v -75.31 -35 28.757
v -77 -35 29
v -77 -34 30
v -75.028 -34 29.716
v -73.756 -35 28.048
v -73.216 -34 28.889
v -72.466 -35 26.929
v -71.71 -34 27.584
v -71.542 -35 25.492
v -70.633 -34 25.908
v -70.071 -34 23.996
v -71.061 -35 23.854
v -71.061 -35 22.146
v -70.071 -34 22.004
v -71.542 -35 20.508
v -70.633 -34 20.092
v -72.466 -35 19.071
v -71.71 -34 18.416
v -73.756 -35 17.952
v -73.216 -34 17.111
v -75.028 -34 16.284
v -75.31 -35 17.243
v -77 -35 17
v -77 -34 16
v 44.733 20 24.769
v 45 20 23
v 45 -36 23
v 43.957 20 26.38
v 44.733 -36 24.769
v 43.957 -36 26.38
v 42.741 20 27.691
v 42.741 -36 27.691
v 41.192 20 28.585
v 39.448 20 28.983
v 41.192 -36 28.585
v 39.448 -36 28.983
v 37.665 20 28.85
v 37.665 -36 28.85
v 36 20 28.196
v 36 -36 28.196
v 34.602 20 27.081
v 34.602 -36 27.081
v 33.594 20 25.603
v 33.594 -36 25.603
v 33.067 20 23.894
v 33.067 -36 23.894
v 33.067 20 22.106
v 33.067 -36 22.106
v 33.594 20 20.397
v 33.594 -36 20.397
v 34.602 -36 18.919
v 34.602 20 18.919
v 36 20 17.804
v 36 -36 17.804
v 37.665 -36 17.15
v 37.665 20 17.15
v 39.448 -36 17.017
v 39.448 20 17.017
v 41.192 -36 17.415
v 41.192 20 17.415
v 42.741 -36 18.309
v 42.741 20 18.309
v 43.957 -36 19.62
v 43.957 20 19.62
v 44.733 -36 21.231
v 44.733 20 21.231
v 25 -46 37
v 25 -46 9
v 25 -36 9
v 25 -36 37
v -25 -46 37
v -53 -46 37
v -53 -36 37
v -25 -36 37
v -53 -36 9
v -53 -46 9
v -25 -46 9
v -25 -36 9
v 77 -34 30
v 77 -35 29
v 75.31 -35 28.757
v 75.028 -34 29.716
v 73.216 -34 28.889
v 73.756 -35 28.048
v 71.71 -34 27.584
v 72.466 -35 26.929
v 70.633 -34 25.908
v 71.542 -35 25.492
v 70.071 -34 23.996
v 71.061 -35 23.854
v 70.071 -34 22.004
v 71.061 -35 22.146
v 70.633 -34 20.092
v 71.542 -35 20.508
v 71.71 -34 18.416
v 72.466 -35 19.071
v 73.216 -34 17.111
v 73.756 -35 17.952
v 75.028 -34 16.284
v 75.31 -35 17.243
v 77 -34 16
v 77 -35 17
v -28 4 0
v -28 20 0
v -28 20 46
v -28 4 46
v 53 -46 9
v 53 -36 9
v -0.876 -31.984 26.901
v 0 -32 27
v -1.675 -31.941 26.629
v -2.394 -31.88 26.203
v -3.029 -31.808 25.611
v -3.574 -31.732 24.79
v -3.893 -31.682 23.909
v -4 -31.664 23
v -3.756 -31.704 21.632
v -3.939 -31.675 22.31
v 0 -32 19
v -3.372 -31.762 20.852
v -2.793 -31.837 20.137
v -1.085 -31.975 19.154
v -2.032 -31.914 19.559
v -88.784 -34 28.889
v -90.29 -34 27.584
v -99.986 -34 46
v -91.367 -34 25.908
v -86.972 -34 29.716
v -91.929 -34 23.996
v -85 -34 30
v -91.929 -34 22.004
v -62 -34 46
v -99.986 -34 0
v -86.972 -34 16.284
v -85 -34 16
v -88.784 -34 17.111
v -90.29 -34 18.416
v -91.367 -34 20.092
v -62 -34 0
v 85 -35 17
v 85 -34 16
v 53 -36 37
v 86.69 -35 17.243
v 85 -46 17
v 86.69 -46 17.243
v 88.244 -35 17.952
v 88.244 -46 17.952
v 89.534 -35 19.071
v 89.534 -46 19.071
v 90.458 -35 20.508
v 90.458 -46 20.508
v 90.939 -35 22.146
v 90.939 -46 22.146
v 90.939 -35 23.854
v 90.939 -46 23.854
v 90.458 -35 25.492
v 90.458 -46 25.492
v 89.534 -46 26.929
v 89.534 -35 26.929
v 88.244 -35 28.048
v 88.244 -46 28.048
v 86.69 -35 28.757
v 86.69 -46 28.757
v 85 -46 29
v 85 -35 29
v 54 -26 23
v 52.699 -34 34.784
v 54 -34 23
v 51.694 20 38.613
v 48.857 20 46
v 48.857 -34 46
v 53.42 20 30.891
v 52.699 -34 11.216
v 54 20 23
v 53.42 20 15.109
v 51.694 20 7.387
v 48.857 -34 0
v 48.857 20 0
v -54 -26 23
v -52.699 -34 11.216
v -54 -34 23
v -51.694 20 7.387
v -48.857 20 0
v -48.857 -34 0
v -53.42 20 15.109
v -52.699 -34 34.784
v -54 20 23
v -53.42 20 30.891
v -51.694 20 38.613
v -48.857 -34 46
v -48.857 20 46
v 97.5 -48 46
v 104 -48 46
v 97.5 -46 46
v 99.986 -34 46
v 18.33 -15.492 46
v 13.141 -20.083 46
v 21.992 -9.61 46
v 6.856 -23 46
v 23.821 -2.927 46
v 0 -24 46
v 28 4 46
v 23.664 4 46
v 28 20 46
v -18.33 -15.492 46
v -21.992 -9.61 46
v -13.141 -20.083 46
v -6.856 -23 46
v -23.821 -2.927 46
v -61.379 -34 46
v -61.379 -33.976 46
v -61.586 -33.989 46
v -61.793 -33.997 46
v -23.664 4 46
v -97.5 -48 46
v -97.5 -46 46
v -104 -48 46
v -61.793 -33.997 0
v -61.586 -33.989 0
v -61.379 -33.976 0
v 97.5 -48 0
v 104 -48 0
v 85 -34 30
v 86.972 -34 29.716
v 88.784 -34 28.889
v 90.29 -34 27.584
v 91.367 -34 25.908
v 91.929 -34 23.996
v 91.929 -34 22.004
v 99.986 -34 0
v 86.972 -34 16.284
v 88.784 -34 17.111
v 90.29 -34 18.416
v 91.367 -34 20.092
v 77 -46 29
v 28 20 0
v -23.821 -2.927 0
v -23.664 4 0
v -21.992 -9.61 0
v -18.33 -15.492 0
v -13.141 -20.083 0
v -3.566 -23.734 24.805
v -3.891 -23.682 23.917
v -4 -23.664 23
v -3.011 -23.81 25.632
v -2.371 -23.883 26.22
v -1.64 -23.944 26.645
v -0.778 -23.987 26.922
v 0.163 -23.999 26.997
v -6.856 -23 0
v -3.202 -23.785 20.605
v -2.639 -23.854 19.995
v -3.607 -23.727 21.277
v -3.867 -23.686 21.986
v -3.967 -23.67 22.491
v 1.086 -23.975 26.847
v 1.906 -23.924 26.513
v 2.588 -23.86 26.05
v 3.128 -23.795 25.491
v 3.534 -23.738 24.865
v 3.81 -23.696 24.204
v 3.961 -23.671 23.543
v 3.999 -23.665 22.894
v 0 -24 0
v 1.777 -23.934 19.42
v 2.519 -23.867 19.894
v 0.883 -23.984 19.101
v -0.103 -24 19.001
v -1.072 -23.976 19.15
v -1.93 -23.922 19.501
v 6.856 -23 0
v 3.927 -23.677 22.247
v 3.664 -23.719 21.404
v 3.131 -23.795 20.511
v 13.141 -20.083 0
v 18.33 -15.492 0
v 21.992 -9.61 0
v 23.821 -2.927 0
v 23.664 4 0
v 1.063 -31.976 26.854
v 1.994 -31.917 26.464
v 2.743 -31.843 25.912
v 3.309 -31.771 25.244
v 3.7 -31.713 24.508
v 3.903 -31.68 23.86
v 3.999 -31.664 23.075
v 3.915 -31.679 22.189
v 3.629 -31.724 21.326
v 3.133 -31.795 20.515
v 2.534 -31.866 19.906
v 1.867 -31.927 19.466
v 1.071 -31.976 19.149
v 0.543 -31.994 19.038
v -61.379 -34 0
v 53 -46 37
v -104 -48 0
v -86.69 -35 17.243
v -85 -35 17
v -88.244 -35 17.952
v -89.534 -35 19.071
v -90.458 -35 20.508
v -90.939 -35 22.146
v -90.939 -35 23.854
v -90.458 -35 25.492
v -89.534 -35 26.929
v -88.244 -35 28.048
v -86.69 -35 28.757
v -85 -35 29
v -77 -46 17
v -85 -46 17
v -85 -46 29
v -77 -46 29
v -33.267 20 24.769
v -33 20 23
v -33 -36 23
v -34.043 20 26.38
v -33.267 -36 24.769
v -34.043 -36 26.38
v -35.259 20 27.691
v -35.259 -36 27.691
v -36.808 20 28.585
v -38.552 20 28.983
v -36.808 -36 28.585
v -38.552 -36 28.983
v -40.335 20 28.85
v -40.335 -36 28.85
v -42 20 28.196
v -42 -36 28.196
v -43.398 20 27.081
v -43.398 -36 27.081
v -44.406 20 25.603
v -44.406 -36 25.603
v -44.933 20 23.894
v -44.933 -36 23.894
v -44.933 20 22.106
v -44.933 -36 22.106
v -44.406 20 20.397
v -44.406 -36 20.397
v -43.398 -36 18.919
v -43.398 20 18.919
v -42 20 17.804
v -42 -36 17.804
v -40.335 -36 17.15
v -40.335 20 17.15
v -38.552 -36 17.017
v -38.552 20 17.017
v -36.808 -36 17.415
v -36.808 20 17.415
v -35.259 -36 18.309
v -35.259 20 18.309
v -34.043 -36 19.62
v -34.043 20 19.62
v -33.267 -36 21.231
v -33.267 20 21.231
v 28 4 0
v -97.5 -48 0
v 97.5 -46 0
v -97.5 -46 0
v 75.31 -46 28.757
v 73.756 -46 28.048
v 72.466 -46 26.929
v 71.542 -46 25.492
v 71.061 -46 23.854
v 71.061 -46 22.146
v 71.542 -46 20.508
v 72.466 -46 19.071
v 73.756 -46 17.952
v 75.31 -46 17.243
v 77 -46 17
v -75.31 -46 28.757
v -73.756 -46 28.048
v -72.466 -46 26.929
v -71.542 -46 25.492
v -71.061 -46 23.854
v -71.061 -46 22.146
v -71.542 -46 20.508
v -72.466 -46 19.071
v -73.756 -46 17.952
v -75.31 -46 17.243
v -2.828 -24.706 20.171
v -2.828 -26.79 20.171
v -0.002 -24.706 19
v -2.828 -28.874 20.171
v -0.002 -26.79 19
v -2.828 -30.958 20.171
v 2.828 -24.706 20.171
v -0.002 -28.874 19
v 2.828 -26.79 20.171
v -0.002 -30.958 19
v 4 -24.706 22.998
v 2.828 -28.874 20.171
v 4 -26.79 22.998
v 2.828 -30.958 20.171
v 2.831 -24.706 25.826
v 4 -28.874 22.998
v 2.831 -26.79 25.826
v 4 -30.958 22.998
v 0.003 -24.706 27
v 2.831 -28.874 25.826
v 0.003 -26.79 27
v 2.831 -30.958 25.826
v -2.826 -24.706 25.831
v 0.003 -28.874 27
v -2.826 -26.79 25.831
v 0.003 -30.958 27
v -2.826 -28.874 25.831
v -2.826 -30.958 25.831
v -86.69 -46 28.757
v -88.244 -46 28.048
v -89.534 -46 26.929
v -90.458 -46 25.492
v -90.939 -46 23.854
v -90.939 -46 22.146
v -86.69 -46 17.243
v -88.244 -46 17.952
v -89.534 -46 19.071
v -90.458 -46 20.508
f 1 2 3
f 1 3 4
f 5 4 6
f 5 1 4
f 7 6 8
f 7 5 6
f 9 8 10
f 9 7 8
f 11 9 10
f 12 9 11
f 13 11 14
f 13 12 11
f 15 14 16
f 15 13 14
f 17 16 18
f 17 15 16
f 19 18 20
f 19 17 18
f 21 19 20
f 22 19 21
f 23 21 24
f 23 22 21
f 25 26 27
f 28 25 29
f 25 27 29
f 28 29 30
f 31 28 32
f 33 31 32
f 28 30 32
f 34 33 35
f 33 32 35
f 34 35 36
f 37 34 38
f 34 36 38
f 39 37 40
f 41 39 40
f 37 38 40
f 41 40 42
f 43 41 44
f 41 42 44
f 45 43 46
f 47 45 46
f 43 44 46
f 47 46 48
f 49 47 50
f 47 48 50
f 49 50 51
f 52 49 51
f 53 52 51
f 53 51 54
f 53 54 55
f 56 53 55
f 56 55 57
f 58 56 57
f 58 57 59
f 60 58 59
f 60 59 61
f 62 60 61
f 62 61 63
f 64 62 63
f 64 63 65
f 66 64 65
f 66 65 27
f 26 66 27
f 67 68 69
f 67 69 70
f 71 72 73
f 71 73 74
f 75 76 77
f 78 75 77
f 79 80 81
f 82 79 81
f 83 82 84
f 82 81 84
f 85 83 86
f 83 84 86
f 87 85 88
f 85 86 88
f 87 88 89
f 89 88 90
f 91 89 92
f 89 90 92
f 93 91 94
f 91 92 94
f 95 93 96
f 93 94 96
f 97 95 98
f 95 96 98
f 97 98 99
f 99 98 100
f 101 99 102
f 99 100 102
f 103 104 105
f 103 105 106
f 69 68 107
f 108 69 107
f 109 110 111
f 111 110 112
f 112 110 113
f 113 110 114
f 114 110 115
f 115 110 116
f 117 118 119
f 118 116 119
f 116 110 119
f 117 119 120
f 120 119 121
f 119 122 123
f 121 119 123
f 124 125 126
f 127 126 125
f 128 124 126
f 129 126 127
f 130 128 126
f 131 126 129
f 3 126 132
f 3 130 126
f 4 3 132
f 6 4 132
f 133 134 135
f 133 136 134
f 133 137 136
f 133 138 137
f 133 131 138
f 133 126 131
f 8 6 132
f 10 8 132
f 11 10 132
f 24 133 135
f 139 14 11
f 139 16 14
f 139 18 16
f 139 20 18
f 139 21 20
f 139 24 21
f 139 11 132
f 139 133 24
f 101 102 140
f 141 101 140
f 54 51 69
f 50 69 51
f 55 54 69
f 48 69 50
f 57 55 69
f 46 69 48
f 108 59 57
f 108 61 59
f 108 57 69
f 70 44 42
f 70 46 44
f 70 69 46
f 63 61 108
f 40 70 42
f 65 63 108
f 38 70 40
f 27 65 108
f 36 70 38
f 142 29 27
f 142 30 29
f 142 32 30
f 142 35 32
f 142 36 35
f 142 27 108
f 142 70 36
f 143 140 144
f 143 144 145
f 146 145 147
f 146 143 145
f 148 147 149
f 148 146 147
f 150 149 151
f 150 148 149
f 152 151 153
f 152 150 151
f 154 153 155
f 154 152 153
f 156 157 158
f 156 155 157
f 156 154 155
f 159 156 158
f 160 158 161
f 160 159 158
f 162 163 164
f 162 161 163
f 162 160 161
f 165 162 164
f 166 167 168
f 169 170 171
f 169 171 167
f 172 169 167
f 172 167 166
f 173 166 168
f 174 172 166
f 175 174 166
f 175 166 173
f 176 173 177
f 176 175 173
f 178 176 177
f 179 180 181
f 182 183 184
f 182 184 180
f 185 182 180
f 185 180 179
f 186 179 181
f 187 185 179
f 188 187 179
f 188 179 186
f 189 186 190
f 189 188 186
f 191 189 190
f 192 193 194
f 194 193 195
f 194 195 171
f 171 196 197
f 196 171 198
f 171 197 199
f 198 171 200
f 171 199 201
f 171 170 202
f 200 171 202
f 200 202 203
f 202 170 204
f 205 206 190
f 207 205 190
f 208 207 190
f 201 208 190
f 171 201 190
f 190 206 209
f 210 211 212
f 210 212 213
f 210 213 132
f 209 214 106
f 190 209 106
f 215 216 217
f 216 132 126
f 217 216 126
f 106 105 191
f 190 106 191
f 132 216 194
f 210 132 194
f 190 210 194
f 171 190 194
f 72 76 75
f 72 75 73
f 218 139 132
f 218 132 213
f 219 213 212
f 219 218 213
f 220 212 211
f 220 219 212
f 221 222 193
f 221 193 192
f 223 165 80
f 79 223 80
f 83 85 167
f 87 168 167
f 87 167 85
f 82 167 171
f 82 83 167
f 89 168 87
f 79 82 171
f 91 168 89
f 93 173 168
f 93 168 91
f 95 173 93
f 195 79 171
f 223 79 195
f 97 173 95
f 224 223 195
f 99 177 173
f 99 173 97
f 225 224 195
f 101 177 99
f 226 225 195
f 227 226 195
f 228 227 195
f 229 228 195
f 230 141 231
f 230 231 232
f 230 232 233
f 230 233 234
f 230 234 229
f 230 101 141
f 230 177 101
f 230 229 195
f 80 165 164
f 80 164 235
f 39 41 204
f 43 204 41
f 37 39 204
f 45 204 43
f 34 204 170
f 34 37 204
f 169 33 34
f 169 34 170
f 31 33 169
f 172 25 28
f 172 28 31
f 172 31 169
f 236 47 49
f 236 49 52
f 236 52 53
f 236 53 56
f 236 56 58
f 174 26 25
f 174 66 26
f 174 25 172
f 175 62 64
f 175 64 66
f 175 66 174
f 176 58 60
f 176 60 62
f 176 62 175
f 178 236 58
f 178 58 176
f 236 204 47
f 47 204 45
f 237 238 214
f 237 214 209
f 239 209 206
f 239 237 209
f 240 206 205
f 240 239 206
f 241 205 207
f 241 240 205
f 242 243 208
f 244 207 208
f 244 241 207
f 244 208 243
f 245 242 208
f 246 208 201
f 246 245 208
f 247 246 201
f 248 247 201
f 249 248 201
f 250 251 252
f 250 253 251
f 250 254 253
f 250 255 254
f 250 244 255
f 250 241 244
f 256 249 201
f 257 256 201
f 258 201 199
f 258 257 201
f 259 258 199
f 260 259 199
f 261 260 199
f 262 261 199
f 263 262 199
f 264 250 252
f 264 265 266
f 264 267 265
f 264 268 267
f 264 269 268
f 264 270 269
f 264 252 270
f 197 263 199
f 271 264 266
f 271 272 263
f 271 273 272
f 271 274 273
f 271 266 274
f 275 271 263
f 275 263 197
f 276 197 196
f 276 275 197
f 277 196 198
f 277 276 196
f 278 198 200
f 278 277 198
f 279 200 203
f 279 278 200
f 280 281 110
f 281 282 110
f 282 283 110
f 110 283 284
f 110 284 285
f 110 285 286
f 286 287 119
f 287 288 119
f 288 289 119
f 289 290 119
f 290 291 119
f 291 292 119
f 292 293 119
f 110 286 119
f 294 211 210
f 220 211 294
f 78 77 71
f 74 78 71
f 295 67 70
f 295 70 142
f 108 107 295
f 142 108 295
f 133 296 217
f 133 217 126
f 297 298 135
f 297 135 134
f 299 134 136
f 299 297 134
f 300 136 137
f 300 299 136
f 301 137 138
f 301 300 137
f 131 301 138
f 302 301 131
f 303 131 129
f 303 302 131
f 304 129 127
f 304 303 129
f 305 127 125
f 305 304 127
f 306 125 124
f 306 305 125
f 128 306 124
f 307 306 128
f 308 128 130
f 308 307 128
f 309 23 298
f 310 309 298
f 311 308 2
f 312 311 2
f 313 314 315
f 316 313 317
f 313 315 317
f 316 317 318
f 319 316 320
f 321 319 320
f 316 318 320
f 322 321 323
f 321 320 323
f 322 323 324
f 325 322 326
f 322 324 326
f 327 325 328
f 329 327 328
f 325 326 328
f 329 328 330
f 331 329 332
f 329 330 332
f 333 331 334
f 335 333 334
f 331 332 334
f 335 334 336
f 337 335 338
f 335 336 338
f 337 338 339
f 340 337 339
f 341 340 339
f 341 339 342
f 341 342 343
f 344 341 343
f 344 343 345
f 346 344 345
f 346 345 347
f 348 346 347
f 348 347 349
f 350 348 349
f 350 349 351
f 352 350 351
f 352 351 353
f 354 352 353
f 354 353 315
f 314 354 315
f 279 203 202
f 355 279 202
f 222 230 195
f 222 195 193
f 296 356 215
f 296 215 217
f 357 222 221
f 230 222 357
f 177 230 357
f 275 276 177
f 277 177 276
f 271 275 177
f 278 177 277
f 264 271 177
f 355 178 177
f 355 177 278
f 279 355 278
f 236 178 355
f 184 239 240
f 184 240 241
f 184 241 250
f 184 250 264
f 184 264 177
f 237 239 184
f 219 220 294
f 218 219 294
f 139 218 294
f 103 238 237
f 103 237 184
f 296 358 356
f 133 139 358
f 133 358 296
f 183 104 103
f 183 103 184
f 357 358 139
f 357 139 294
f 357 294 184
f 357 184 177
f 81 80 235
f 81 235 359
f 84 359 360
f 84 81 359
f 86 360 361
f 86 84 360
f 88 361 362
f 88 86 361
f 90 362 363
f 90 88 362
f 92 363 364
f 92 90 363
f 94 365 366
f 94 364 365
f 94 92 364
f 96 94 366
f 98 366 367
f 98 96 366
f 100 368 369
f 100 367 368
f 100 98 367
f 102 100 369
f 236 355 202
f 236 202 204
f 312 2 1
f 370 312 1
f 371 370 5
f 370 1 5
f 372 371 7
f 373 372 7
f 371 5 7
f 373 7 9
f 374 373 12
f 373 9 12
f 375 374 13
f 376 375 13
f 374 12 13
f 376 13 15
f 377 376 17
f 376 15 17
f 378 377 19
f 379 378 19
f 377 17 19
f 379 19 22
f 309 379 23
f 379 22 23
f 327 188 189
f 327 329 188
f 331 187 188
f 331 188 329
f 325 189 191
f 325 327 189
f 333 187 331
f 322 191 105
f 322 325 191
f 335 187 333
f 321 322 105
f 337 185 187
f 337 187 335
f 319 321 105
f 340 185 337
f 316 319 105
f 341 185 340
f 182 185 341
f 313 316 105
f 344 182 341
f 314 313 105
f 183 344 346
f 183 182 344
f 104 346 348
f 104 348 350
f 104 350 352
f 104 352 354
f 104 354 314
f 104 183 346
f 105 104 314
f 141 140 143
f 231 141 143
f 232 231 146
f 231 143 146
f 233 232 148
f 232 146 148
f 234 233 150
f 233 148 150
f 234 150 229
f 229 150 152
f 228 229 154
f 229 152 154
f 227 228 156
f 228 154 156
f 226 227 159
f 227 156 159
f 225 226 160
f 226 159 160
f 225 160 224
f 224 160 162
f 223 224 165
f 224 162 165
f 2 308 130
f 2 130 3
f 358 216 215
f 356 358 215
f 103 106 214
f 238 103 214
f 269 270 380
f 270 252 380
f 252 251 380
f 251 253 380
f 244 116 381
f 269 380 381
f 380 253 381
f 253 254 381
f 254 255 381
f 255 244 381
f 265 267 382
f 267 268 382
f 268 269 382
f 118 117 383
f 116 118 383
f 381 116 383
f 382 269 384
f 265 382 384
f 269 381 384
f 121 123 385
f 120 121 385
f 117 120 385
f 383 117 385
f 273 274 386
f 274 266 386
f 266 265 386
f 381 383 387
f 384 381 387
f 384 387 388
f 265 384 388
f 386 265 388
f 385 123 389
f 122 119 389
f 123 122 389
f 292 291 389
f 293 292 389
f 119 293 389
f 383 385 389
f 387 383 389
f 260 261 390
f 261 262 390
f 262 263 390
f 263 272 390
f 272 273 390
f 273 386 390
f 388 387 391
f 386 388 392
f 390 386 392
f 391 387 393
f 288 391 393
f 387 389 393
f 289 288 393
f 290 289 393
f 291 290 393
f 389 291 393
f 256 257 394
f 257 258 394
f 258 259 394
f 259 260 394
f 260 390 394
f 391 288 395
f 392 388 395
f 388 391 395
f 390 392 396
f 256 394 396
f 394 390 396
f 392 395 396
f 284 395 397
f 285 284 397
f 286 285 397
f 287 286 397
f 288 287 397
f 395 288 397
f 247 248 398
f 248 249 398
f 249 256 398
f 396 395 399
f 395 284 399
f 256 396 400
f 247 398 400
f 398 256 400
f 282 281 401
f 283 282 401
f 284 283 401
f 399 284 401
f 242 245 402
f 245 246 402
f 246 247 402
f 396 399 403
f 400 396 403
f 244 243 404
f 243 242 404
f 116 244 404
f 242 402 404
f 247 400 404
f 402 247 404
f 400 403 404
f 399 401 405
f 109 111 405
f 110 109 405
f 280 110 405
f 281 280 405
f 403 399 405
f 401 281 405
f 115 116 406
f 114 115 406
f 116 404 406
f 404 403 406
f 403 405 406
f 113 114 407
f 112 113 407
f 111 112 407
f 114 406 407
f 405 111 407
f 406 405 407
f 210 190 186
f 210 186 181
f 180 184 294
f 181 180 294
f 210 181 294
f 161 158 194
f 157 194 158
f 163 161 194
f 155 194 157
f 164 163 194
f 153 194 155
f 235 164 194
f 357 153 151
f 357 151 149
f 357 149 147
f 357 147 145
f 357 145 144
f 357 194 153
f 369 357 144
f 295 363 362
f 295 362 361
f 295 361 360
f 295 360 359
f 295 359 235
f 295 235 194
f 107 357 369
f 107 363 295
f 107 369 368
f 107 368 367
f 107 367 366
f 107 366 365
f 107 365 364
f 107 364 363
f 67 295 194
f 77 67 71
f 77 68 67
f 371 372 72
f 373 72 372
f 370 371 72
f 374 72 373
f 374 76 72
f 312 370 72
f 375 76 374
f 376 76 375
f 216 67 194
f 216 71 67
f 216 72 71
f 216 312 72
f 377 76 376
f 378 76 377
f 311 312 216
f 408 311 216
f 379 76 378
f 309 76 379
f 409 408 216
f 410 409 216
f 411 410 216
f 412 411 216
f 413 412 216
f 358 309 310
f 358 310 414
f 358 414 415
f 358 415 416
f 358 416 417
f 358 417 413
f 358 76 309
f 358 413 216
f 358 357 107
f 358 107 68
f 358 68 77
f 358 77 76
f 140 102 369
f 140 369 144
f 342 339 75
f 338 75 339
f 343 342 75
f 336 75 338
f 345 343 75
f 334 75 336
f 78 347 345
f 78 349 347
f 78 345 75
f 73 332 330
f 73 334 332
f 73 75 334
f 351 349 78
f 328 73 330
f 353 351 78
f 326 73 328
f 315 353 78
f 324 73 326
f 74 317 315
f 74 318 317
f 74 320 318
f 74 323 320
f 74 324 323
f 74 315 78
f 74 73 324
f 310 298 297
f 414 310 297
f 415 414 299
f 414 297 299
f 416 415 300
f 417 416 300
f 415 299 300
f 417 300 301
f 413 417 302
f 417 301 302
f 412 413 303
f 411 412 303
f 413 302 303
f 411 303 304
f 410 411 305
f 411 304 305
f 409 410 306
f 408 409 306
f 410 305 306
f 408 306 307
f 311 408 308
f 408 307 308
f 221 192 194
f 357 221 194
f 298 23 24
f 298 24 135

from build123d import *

# Parameters (mm, degrees)
BOSS_EXTRUDE2_DEPTH  = 46
CUT_EXTRUDE1_START   = -52.000000108
CUT_EXTRUDE1_DEPTH   = 36.000000108
CUT_EXTRUDE1_START_2 = 18
CUT_EXTRUDE1_2_DEPTH = 10
CUT_EXTRUDE4_DEPTH   = 126.888839891
CHAMFER1_SIZE        = 1
CUT_EXTRUDE6_DEPTH   = 54
SKETCH7_W            = 28
SKETCH7_H            = 28
CUT_EXTRUDE7_DEPTH   = 10
SKETCH8_R            = 6
CUT_EXTRUDE8_DEPTH   = 127.759615321


with BuildPart() as part:
    # Sketch1 → Boss-Extrude2 (new body)
    with BuildSketch(Plane.XY):
        with BuildLine():
            Line((-28, 20), (-28, 4))
            Line((-28, 4), (-23.664319132, 4))
            ThreePointArc((-23.664319132, 4), (0, -24), (23.664319132, 4))
            Line((23.664319132, 4), (28, 4))
            Line((28, 4), (28, 20))
            Line((28, 20), (54, 20))
            Line((54, 20), (54, -26))
            ThreePointArc((54, -26), (56.343145751, -31.656854249), (62, -34))
            Line((62, -34), (99.985564599, -34))
            Line((99.985564599, -34), (104, -48))
            Line((104, -48), (97.5, -48))
            Line((97.5, -48), (97.5, -46))
            Line((97.5, -46), (-97.5, -46))
            Line((-97.5, -46), (-97.5, -48))
            Line((-97.5, -48), (-104, -48))
            Line((-104, -48), (-99.985564599, -34))
            Line((-99.985564599, -34), (-62, -34))
            ThreePointArc((-62, -34), (-56.343145751, -31.656854249), (-54, -26))
            Line((-54, -26), (-54, 20))
            Line((-54, 20), (-28, 20))
        make_face()
    extrude(amount=BOSS_EXTRUDE2_DEPTH)

    # Cut-Extrude1: read off the stored shape, not the designer's step
    # Cut-Extrude1 outline → Cut-Extrude1 (cut)
    with BuildSketch(Plane(origin=(0, 20, 0), x_dir=(1, 0, 0), z_dir=(0, 1, 0)).offset(CUT_EXTRUDE1_START)):
        with BuildLine():
            add(Edge.make_bspline(
                [(-4, -23), (-4, -21.940981337), (-3.564754015, -20.907732875), (-2.091459192, -19.434771906), (-1.047779124, -19.000600686), (1.043187737, -18.999400631), (2.08248981, -19.42606245), (3.572744195, -20.91546352), (3.999590121, -21.953345573), (4.000409264, -24.043519212), (3.567812098, -25.087662609), (2.094321457, -26.563907402), (1.060428453, -26.999150693), (-1.054011474, -27.000846733), (-2.089559005, -26.5661873), (-3.563043078, -25.094915922), (-4, -24.059018663), (-4, -23)],
                knots=[0, 0, 0, 0, 0.125, 0.125, 0.25, 0.25, 0.375, 0.375, 0.5, 0.5, 0.625, 0.625, 0.75, 0.75, 0.875, 0.875, 1, 1, 1, 1], degree=3))
        make_face()
    extrude(amount=CUT_EXTRUDE1_DEPTH, mode=Mode.SUBTRACT)

    # Cut-Extrude1 2 outline → Cut-Extrude1 2 (add)
    with BuildSketch(Plane.XY.offset(CUT_EXTRUDE1_START_2)):
        with BuildLine():
            Line((5, -31.49528396), (4.000099427, -31.664302326))
            ThreePointArc((4.000099427, -31.664302326), (2.007080448, -31.915928334), (-8.2e-08, -32))
            Line((-8.2e-08, -32), (5, -32.000000108))
            Line((5, -32.000000108), (5, -31.49528396))
        make_face()
        with BuildLine():
            Line((-5, -32.000000108), (-8.2e-08, -32))
            ThreePointArc((-8.2e-08, -32), (-2.00703047, -31.915932528), (-4.000000362, -31.664319071))
            Line((-4.000000362, -31.664319071), (-5, -31.495288265))
            Line((-5, -31.495288265), (-5, -32.000000108))
        make_face()
    extrude(amount=CUT_EXTRUDE1_2_DEPTH)

    # Sketch5 → Cut-Extrude4 (cut, through all)
    with BuildSketch(Plane(origin=(0, -34, 0), x_dir=(1, 0, 0), z_dir=(0, 1, 0))):
        with BuildLine():
            Line((77, -17), (85, -17))
            ThreePointArc((85, -17), (91, -23), (85, -29))
            Line((85, -29), (77, -29))
            ThreePointArc((77, -29), (71, -23), (77, -17))
        make_face()
        with BuildLine():
            Line((-77, -17), (-85, -17))
            ThreePointArc((-85, -17), (-91, -23), (-85, -29))
            Line((-85, -29), (-77, -29))
            ThreePointArc((-77, -29), (-71, -23), (-77, -17))
        make_face()
    extrude(amount=-CUT_EXTRUDE4_DEPTH, mode=Mode.SUBTRACT)

    # Chamfer1
    chamfer1_edges = [part.edges().sort_by_distance(p)[0] for p in [
        (71, -34, 23),
        (81, -34, 29),
        (91, -34, 23),
        (81, -34, 17),
        (-71, -34, 23),
        (-81, -34, 17),
        (-91, -34, 23),
        (-81, -34, 29),
    ]]
    chamfer(chamfer1_edges, length=CHAMFER1_SIZE)

    # Sketch6 → Cut-Extrude6 (cut)
    with BuildSketch(Plane(origin=(0, 20, 0), x_dir=(1, 0, 0), z_dir=(0, 1, 0))):
        with BuildLine():
            Line((54, -46), (48.856934001, -46))
            ThreePointArc((48.856934001, -46), (54, -23), (48.856934001, 0))
            Line((48.856934001, 0), (54, 0))
            Line((54, 0), (63.209098635, 0))
            Line((63.209098635, 0), (63.209098635, -46))
            Line((63.209098635, -46), (54, -46))
        make_face()
        with BuildLine():
            Line((-48.856934001, -46), (-54, -46))
            Line((-54, -46), (-61.379097466, -46))
            Line((-61.379097466, -46), (-61.379097466, 0))
            Line((-61.379097466, 0), (-54, 0))
            Line((-54, 0), (-48.856934001, 0))
            ThreePointArc((-48.856934001, 0), (-54, -23), (-48.856934001, -46))
        make_face()
    extrude(amount=-CUT_EXTRUDE6_DEPTH, mode=Mode.SUBTRACT)

    # Sketch7 → Cut-Extrude7 (cut)
    with BuildSketch(Plane.XZ.offset(46)):
        with Locations((-39, 23)):
            Rectangle(SKETCH7_W, SKETCH7_H)
        with Locations((39, 23)):
            Rectangle(SKETCH7_W, SKETCH7_H)
    extrude(amount=-CUT_EXTRUDE7_DEPTH, mode=Mode.SUBTRACT)

    # Sketch8 → Cut-Extrude8 (cut, through all)
    with BuildSketch(Plane.XZ.offset(36)):
        with Locations((-39, 23)):
            Circle(SKETCH8_R)
        with Locations((39, 23)):
            Circle(SKETCH8_R)
    extrude(amount=-CUT_EXTRUDE8_DEPTH, mode=Mode.SUBTRACT)


solid = part.part
